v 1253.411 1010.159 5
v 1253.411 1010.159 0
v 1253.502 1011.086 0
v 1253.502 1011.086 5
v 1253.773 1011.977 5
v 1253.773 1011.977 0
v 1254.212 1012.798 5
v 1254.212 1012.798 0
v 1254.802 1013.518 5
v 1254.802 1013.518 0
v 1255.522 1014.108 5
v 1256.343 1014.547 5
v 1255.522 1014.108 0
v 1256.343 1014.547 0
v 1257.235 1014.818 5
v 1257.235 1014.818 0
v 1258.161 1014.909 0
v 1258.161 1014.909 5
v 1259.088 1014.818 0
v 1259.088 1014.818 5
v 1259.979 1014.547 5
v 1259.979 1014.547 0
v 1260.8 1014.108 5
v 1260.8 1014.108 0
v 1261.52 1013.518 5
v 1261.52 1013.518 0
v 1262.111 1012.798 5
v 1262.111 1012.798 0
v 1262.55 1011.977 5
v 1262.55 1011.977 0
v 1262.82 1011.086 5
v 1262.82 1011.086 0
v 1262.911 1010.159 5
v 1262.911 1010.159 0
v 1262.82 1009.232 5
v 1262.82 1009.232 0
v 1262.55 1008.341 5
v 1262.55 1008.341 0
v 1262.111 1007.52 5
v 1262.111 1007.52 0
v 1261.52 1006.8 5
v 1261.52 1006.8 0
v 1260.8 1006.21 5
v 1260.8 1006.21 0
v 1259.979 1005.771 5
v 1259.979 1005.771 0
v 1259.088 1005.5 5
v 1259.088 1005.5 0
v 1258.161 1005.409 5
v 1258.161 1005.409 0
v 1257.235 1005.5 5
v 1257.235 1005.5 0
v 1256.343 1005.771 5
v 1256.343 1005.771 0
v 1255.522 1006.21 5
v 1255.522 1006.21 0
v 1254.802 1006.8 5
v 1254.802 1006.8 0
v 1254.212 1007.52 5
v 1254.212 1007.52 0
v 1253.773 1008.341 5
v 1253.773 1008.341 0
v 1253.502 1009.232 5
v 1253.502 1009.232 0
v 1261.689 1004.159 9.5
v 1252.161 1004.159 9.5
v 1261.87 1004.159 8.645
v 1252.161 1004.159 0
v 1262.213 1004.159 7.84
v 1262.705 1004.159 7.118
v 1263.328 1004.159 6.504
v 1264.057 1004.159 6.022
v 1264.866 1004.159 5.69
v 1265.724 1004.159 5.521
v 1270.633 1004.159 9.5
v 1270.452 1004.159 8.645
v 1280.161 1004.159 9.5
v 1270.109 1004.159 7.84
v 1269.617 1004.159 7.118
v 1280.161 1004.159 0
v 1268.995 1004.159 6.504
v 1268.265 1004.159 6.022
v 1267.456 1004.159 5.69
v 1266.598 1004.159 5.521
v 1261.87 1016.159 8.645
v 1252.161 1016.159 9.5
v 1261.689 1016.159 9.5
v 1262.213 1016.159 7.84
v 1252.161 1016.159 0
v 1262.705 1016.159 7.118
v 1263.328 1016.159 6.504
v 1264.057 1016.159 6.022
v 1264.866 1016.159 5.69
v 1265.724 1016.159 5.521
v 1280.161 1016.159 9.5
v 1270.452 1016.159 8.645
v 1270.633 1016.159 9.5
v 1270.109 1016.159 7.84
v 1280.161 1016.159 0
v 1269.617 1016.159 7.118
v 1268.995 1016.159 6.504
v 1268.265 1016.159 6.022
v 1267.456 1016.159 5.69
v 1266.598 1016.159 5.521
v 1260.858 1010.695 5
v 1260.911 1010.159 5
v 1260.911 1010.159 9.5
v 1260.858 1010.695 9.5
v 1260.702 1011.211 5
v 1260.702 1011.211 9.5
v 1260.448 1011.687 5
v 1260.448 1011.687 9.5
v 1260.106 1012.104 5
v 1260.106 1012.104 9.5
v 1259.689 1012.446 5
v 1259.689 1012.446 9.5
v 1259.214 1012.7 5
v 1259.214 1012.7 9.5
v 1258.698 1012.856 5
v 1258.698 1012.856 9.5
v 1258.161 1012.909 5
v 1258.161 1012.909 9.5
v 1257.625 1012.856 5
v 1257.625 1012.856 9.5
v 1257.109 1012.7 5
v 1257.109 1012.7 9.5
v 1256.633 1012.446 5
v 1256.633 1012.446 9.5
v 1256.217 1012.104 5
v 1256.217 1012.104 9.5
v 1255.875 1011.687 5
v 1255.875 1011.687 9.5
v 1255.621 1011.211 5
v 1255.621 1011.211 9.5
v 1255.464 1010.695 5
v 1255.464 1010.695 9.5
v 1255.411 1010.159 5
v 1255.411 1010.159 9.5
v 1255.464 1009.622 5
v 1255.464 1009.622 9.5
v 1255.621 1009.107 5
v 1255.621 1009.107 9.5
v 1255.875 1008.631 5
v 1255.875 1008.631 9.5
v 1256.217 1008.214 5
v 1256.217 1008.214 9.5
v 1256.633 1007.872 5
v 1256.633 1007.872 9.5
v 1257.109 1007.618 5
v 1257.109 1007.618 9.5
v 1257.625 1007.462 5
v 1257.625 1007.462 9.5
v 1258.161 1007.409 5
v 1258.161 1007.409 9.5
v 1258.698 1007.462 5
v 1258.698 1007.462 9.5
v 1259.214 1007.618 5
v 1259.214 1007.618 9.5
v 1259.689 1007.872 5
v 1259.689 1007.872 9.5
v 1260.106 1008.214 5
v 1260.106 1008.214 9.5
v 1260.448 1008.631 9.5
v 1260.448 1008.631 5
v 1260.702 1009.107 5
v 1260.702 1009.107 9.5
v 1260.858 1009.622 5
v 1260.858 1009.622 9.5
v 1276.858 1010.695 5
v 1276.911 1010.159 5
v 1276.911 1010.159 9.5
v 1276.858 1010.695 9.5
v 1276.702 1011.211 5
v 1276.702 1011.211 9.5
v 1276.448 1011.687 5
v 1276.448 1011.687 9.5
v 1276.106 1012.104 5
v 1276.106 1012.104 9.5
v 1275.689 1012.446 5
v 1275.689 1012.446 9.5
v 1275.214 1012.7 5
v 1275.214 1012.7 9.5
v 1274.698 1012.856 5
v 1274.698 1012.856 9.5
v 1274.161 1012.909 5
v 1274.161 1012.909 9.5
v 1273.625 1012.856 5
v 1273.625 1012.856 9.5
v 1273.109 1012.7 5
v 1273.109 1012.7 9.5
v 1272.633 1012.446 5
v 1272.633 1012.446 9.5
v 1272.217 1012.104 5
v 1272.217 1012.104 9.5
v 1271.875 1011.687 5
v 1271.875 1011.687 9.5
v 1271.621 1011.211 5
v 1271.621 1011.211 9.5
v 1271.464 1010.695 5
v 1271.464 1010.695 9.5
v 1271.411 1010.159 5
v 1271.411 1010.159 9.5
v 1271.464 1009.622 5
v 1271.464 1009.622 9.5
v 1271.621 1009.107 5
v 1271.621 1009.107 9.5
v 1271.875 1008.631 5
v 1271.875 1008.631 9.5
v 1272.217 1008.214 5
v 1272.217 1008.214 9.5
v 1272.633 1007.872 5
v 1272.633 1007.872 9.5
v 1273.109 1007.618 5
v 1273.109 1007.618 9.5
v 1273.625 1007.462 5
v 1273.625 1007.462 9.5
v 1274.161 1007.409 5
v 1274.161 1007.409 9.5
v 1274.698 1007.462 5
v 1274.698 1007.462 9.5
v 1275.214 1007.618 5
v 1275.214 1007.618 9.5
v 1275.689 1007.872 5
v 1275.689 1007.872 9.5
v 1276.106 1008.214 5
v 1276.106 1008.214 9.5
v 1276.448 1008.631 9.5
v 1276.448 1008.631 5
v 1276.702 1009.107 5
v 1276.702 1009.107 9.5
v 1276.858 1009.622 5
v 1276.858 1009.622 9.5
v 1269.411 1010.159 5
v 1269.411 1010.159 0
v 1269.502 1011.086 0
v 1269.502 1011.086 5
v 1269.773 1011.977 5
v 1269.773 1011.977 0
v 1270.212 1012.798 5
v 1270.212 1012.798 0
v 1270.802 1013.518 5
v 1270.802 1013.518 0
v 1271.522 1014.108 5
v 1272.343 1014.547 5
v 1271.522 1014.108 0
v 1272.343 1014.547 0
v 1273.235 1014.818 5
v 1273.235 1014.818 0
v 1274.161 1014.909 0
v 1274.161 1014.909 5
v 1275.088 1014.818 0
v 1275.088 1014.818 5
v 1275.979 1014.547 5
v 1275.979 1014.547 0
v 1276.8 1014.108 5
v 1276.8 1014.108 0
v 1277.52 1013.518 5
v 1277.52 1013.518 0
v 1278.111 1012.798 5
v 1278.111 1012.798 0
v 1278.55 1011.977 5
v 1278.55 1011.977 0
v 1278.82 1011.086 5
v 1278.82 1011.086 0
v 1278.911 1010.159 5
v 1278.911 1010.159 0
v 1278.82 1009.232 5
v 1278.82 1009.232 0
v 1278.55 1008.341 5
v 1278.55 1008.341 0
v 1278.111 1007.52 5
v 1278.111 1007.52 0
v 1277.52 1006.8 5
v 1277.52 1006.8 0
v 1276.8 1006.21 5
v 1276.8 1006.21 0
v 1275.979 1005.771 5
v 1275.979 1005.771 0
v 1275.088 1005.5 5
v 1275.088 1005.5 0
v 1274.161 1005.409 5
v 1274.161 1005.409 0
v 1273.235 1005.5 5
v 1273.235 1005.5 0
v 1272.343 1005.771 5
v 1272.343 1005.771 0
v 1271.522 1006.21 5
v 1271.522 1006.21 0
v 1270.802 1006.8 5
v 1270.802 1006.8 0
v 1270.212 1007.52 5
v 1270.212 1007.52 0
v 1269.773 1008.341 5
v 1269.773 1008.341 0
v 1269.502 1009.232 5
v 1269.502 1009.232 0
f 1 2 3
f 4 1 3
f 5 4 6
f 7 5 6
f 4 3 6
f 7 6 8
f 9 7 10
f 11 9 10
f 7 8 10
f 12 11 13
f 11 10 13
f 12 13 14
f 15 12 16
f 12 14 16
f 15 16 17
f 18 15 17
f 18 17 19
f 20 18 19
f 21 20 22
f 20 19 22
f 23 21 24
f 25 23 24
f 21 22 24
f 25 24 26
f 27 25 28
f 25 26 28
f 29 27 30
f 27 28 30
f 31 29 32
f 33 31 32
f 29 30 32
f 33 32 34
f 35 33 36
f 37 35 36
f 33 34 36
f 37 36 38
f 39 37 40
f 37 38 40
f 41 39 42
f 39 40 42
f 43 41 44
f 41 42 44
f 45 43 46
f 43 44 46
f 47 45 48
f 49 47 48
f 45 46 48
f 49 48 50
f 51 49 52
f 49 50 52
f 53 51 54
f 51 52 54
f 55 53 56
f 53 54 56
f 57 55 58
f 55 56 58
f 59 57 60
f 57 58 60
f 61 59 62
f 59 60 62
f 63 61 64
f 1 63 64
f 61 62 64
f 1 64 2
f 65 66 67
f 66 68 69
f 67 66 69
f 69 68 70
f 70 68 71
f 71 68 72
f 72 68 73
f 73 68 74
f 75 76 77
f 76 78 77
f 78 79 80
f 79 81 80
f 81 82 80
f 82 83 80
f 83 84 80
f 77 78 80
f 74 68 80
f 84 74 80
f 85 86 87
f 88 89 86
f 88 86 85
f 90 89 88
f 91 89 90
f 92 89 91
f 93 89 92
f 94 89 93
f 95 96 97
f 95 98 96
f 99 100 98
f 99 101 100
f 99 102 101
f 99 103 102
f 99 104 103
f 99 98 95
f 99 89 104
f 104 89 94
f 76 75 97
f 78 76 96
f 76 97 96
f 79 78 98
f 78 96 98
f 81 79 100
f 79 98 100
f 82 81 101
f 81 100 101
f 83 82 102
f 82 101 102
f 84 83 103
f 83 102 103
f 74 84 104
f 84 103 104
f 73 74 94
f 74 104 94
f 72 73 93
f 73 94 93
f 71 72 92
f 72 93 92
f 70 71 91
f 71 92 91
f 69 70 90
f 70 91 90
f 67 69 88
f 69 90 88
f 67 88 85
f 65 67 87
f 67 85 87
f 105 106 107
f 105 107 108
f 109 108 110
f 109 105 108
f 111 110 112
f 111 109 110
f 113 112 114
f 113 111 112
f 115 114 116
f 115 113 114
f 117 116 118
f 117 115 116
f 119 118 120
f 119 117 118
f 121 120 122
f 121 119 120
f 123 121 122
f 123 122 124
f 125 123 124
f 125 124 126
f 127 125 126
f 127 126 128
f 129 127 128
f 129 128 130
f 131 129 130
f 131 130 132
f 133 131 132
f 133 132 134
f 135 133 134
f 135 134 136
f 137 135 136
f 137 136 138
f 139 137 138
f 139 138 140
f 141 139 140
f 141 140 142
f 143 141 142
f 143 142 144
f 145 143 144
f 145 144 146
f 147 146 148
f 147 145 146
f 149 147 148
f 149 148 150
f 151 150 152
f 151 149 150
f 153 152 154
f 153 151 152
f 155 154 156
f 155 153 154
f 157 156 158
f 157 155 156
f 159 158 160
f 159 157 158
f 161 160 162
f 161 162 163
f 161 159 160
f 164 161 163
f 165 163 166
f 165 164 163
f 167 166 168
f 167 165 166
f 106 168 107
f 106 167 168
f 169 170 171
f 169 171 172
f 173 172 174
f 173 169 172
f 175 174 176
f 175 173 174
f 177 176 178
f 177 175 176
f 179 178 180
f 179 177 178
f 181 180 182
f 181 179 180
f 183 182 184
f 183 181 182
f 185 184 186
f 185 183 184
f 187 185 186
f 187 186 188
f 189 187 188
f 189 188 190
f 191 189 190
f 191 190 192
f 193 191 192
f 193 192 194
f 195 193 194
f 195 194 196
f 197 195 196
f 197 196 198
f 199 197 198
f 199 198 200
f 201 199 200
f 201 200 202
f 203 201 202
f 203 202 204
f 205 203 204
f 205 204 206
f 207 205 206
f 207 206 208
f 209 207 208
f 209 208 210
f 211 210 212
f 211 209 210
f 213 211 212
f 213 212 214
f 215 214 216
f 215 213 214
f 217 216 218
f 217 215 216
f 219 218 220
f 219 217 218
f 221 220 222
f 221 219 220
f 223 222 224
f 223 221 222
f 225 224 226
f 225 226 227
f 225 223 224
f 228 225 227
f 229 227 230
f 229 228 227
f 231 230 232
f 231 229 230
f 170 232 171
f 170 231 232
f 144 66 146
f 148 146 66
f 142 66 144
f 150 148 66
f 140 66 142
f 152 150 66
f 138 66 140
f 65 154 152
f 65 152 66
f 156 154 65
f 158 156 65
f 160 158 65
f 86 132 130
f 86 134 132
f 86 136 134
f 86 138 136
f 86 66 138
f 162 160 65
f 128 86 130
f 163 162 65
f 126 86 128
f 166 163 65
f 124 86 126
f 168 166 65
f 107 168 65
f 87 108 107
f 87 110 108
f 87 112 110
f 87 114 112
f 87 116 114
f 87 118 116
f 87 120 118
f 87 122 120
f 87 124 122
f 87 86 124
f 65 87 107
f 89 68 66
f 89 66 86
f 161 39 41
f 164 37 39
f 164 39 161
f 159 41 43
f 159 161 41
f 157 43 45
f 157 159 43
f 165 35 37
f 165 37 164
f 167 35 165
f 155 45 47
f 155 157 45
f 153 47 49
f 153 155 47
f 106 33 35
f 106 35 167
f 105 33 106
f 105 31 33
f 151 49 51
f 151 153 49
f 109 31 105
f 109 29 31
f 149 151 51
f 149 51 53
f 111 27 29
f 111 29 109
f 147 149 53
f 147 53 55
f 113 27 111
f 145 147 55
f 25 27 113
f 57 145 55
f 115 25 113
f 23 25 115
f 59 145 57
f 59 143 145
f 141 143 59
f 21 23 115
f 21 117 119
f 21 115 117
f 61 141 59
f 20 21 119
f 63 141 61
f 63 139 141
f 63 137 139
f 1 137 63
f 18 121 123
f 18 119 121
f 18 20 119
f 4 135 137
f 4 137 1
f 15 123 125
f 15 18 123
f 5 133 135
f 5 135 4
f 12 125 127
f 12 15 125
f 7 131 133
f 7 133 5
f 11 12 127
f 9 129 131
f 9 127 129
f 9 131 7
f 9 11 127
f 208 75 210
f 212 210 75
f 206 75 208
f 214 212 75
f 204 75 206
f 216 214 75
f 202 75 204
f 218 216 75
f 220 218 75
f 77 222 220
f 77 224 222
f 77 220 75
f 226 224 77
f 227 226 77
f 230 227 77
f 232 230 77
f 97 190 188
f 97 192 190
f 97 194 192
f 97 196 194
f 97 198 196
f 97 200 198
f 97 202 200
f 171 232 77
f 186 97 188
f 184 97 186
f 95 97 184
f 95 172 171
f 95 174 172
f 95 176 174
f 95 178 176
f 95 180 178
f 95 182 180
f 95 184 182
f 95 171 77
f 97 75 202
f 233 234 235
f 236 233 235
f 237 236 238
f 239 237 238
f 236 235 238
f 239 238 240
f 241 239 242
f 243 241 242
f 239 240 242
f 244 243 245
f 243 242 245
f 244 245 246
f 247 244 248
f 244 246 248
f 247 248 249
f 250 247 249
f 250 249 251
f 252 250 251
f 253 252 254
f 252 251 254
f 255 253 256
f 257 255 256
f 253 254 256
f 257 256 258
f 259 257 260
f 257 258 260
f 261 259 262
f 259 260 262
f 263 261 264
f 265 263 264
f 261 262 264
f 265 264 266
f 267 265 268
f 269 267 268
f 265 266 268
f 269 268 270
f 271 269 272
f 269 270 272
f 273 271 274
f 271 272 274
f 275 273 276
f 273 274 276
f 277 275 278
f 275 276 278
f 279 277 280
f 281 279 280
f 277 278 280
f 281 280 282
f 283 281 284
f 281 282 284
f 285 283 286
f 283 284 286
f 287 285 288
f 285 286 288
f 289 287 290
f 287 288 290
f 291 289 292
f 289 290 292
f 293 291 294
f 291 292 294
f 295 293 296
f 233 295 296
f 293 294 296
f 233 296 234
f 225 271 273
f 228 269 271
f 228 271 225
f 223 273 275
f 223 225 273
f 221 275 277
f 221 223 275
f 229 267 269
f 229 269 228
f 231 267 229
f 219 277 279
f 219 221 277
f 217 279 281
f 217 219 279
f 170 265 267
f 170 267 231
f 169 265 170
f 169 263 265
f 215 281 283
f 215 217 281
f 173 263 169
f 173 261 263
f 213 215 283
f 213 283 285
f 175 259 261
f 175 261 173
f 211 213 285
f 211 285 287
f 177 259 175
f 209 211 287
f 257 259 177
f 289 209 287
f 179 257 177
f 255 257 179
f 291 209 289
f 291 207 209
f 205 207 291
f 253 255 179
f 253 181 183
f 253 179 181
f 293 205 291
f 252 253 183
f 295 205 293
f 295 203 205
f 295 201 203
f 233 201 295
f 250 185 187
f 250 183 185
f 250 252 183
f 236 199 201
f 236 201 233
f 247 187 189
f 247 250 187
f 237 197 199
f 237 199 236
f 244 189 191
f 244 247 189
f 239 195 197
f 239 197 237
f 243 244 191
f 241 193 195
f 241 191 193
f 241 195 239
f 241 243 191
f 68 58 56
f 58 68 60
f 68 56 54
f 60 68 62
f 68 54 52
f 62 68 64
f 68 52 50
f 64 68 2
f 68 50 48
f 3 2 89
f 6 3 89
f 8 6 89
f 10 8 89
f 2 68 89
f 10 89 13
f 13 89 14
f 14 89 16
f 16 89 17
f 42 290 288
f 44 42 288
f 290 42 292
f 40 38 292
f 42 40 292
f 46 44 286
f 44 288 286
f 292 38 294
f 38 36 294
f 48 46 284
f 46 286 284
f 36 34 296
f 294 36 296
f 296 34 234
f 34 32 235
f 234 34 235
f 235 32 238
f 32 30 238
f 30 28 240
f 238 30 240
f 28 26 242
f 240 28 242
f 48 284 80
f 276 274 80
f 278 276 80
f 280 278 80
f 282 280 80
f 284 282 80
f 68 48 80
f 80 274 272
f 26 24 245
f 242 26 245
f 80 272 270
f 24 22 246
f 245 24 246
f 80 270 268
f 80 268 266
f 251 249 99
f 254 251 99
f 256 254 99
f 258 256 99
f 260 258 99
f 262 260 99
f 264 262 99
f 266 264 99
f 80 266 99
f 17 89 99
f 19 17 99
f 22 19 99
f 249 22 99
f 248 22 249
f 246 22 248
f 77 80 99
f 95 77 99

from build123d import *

# Parameters (mm, degrees)
SKETCH_1_W          = 28
SKETCH_1_H          = 12
SKETCH_1_R          = 2.75
EXTRUDE_1_DEPTH     = 9.5
SKETCH_2_R          = 4.75
CUT_EXTRUDE_2_DEPTH = 5
SKETCH_3_R          = 4.5
CUT_EXTRUDE_3_DEPTH = 1281.252706776


with BuildPart() as part:
    # 草图1 → 拉伸1 (new body)
    with BuildSketch(Plane.XY):
        with Locations((1266.161217663, 1010.158991307)):
            Rectangle(SKETCH_1_W, SKETCH_1_H)
        with Locations((1274.161217663, 1010.158991307)):
            Circle(SKETCH_1_R, mode=Mode.SUBTRACT)
        with Locations((1258.161217663, 1010.158991307)):
            Circle(SKETCH_1_R, mode=Mode.SUBTRACT)
    extrude(amount=EXTRUDE_1_DEPTH)

    # 草图2 → 拉伸2 (cut)
    with BuildSketch(Plane(origin=(0, 0, 0), x_dir=(-1, 0, 0), z_dir=(0, 0, -1))):
        with Locations((-1258.161217663, 1010.158991307)):
            Circle(SKETCH_2_R)
        with Locations((-1274.161217663, 1010.158991307)):
            Circle(SKETCH_2_R)
    extrude(amount=-CUT_EXTRUDE_2_DEPTH, mode=Mode.SUBTRACT)

    # 草图3 → 拉伸3 (cut, through all)
    with BuildSketch(Plane(origin=(0, 1016.158991307, 0), x_dir=(1, 0, 0), z_dir=(0, 1, 0))):
        with Locations((1266.161217663, -10)):
            Circle(SKETCH_3_R)
    extrude(amount=-CUT_EXTRUDE_3_DEPTH, mode=Mode.SUBTRACT)


solid = part.part
